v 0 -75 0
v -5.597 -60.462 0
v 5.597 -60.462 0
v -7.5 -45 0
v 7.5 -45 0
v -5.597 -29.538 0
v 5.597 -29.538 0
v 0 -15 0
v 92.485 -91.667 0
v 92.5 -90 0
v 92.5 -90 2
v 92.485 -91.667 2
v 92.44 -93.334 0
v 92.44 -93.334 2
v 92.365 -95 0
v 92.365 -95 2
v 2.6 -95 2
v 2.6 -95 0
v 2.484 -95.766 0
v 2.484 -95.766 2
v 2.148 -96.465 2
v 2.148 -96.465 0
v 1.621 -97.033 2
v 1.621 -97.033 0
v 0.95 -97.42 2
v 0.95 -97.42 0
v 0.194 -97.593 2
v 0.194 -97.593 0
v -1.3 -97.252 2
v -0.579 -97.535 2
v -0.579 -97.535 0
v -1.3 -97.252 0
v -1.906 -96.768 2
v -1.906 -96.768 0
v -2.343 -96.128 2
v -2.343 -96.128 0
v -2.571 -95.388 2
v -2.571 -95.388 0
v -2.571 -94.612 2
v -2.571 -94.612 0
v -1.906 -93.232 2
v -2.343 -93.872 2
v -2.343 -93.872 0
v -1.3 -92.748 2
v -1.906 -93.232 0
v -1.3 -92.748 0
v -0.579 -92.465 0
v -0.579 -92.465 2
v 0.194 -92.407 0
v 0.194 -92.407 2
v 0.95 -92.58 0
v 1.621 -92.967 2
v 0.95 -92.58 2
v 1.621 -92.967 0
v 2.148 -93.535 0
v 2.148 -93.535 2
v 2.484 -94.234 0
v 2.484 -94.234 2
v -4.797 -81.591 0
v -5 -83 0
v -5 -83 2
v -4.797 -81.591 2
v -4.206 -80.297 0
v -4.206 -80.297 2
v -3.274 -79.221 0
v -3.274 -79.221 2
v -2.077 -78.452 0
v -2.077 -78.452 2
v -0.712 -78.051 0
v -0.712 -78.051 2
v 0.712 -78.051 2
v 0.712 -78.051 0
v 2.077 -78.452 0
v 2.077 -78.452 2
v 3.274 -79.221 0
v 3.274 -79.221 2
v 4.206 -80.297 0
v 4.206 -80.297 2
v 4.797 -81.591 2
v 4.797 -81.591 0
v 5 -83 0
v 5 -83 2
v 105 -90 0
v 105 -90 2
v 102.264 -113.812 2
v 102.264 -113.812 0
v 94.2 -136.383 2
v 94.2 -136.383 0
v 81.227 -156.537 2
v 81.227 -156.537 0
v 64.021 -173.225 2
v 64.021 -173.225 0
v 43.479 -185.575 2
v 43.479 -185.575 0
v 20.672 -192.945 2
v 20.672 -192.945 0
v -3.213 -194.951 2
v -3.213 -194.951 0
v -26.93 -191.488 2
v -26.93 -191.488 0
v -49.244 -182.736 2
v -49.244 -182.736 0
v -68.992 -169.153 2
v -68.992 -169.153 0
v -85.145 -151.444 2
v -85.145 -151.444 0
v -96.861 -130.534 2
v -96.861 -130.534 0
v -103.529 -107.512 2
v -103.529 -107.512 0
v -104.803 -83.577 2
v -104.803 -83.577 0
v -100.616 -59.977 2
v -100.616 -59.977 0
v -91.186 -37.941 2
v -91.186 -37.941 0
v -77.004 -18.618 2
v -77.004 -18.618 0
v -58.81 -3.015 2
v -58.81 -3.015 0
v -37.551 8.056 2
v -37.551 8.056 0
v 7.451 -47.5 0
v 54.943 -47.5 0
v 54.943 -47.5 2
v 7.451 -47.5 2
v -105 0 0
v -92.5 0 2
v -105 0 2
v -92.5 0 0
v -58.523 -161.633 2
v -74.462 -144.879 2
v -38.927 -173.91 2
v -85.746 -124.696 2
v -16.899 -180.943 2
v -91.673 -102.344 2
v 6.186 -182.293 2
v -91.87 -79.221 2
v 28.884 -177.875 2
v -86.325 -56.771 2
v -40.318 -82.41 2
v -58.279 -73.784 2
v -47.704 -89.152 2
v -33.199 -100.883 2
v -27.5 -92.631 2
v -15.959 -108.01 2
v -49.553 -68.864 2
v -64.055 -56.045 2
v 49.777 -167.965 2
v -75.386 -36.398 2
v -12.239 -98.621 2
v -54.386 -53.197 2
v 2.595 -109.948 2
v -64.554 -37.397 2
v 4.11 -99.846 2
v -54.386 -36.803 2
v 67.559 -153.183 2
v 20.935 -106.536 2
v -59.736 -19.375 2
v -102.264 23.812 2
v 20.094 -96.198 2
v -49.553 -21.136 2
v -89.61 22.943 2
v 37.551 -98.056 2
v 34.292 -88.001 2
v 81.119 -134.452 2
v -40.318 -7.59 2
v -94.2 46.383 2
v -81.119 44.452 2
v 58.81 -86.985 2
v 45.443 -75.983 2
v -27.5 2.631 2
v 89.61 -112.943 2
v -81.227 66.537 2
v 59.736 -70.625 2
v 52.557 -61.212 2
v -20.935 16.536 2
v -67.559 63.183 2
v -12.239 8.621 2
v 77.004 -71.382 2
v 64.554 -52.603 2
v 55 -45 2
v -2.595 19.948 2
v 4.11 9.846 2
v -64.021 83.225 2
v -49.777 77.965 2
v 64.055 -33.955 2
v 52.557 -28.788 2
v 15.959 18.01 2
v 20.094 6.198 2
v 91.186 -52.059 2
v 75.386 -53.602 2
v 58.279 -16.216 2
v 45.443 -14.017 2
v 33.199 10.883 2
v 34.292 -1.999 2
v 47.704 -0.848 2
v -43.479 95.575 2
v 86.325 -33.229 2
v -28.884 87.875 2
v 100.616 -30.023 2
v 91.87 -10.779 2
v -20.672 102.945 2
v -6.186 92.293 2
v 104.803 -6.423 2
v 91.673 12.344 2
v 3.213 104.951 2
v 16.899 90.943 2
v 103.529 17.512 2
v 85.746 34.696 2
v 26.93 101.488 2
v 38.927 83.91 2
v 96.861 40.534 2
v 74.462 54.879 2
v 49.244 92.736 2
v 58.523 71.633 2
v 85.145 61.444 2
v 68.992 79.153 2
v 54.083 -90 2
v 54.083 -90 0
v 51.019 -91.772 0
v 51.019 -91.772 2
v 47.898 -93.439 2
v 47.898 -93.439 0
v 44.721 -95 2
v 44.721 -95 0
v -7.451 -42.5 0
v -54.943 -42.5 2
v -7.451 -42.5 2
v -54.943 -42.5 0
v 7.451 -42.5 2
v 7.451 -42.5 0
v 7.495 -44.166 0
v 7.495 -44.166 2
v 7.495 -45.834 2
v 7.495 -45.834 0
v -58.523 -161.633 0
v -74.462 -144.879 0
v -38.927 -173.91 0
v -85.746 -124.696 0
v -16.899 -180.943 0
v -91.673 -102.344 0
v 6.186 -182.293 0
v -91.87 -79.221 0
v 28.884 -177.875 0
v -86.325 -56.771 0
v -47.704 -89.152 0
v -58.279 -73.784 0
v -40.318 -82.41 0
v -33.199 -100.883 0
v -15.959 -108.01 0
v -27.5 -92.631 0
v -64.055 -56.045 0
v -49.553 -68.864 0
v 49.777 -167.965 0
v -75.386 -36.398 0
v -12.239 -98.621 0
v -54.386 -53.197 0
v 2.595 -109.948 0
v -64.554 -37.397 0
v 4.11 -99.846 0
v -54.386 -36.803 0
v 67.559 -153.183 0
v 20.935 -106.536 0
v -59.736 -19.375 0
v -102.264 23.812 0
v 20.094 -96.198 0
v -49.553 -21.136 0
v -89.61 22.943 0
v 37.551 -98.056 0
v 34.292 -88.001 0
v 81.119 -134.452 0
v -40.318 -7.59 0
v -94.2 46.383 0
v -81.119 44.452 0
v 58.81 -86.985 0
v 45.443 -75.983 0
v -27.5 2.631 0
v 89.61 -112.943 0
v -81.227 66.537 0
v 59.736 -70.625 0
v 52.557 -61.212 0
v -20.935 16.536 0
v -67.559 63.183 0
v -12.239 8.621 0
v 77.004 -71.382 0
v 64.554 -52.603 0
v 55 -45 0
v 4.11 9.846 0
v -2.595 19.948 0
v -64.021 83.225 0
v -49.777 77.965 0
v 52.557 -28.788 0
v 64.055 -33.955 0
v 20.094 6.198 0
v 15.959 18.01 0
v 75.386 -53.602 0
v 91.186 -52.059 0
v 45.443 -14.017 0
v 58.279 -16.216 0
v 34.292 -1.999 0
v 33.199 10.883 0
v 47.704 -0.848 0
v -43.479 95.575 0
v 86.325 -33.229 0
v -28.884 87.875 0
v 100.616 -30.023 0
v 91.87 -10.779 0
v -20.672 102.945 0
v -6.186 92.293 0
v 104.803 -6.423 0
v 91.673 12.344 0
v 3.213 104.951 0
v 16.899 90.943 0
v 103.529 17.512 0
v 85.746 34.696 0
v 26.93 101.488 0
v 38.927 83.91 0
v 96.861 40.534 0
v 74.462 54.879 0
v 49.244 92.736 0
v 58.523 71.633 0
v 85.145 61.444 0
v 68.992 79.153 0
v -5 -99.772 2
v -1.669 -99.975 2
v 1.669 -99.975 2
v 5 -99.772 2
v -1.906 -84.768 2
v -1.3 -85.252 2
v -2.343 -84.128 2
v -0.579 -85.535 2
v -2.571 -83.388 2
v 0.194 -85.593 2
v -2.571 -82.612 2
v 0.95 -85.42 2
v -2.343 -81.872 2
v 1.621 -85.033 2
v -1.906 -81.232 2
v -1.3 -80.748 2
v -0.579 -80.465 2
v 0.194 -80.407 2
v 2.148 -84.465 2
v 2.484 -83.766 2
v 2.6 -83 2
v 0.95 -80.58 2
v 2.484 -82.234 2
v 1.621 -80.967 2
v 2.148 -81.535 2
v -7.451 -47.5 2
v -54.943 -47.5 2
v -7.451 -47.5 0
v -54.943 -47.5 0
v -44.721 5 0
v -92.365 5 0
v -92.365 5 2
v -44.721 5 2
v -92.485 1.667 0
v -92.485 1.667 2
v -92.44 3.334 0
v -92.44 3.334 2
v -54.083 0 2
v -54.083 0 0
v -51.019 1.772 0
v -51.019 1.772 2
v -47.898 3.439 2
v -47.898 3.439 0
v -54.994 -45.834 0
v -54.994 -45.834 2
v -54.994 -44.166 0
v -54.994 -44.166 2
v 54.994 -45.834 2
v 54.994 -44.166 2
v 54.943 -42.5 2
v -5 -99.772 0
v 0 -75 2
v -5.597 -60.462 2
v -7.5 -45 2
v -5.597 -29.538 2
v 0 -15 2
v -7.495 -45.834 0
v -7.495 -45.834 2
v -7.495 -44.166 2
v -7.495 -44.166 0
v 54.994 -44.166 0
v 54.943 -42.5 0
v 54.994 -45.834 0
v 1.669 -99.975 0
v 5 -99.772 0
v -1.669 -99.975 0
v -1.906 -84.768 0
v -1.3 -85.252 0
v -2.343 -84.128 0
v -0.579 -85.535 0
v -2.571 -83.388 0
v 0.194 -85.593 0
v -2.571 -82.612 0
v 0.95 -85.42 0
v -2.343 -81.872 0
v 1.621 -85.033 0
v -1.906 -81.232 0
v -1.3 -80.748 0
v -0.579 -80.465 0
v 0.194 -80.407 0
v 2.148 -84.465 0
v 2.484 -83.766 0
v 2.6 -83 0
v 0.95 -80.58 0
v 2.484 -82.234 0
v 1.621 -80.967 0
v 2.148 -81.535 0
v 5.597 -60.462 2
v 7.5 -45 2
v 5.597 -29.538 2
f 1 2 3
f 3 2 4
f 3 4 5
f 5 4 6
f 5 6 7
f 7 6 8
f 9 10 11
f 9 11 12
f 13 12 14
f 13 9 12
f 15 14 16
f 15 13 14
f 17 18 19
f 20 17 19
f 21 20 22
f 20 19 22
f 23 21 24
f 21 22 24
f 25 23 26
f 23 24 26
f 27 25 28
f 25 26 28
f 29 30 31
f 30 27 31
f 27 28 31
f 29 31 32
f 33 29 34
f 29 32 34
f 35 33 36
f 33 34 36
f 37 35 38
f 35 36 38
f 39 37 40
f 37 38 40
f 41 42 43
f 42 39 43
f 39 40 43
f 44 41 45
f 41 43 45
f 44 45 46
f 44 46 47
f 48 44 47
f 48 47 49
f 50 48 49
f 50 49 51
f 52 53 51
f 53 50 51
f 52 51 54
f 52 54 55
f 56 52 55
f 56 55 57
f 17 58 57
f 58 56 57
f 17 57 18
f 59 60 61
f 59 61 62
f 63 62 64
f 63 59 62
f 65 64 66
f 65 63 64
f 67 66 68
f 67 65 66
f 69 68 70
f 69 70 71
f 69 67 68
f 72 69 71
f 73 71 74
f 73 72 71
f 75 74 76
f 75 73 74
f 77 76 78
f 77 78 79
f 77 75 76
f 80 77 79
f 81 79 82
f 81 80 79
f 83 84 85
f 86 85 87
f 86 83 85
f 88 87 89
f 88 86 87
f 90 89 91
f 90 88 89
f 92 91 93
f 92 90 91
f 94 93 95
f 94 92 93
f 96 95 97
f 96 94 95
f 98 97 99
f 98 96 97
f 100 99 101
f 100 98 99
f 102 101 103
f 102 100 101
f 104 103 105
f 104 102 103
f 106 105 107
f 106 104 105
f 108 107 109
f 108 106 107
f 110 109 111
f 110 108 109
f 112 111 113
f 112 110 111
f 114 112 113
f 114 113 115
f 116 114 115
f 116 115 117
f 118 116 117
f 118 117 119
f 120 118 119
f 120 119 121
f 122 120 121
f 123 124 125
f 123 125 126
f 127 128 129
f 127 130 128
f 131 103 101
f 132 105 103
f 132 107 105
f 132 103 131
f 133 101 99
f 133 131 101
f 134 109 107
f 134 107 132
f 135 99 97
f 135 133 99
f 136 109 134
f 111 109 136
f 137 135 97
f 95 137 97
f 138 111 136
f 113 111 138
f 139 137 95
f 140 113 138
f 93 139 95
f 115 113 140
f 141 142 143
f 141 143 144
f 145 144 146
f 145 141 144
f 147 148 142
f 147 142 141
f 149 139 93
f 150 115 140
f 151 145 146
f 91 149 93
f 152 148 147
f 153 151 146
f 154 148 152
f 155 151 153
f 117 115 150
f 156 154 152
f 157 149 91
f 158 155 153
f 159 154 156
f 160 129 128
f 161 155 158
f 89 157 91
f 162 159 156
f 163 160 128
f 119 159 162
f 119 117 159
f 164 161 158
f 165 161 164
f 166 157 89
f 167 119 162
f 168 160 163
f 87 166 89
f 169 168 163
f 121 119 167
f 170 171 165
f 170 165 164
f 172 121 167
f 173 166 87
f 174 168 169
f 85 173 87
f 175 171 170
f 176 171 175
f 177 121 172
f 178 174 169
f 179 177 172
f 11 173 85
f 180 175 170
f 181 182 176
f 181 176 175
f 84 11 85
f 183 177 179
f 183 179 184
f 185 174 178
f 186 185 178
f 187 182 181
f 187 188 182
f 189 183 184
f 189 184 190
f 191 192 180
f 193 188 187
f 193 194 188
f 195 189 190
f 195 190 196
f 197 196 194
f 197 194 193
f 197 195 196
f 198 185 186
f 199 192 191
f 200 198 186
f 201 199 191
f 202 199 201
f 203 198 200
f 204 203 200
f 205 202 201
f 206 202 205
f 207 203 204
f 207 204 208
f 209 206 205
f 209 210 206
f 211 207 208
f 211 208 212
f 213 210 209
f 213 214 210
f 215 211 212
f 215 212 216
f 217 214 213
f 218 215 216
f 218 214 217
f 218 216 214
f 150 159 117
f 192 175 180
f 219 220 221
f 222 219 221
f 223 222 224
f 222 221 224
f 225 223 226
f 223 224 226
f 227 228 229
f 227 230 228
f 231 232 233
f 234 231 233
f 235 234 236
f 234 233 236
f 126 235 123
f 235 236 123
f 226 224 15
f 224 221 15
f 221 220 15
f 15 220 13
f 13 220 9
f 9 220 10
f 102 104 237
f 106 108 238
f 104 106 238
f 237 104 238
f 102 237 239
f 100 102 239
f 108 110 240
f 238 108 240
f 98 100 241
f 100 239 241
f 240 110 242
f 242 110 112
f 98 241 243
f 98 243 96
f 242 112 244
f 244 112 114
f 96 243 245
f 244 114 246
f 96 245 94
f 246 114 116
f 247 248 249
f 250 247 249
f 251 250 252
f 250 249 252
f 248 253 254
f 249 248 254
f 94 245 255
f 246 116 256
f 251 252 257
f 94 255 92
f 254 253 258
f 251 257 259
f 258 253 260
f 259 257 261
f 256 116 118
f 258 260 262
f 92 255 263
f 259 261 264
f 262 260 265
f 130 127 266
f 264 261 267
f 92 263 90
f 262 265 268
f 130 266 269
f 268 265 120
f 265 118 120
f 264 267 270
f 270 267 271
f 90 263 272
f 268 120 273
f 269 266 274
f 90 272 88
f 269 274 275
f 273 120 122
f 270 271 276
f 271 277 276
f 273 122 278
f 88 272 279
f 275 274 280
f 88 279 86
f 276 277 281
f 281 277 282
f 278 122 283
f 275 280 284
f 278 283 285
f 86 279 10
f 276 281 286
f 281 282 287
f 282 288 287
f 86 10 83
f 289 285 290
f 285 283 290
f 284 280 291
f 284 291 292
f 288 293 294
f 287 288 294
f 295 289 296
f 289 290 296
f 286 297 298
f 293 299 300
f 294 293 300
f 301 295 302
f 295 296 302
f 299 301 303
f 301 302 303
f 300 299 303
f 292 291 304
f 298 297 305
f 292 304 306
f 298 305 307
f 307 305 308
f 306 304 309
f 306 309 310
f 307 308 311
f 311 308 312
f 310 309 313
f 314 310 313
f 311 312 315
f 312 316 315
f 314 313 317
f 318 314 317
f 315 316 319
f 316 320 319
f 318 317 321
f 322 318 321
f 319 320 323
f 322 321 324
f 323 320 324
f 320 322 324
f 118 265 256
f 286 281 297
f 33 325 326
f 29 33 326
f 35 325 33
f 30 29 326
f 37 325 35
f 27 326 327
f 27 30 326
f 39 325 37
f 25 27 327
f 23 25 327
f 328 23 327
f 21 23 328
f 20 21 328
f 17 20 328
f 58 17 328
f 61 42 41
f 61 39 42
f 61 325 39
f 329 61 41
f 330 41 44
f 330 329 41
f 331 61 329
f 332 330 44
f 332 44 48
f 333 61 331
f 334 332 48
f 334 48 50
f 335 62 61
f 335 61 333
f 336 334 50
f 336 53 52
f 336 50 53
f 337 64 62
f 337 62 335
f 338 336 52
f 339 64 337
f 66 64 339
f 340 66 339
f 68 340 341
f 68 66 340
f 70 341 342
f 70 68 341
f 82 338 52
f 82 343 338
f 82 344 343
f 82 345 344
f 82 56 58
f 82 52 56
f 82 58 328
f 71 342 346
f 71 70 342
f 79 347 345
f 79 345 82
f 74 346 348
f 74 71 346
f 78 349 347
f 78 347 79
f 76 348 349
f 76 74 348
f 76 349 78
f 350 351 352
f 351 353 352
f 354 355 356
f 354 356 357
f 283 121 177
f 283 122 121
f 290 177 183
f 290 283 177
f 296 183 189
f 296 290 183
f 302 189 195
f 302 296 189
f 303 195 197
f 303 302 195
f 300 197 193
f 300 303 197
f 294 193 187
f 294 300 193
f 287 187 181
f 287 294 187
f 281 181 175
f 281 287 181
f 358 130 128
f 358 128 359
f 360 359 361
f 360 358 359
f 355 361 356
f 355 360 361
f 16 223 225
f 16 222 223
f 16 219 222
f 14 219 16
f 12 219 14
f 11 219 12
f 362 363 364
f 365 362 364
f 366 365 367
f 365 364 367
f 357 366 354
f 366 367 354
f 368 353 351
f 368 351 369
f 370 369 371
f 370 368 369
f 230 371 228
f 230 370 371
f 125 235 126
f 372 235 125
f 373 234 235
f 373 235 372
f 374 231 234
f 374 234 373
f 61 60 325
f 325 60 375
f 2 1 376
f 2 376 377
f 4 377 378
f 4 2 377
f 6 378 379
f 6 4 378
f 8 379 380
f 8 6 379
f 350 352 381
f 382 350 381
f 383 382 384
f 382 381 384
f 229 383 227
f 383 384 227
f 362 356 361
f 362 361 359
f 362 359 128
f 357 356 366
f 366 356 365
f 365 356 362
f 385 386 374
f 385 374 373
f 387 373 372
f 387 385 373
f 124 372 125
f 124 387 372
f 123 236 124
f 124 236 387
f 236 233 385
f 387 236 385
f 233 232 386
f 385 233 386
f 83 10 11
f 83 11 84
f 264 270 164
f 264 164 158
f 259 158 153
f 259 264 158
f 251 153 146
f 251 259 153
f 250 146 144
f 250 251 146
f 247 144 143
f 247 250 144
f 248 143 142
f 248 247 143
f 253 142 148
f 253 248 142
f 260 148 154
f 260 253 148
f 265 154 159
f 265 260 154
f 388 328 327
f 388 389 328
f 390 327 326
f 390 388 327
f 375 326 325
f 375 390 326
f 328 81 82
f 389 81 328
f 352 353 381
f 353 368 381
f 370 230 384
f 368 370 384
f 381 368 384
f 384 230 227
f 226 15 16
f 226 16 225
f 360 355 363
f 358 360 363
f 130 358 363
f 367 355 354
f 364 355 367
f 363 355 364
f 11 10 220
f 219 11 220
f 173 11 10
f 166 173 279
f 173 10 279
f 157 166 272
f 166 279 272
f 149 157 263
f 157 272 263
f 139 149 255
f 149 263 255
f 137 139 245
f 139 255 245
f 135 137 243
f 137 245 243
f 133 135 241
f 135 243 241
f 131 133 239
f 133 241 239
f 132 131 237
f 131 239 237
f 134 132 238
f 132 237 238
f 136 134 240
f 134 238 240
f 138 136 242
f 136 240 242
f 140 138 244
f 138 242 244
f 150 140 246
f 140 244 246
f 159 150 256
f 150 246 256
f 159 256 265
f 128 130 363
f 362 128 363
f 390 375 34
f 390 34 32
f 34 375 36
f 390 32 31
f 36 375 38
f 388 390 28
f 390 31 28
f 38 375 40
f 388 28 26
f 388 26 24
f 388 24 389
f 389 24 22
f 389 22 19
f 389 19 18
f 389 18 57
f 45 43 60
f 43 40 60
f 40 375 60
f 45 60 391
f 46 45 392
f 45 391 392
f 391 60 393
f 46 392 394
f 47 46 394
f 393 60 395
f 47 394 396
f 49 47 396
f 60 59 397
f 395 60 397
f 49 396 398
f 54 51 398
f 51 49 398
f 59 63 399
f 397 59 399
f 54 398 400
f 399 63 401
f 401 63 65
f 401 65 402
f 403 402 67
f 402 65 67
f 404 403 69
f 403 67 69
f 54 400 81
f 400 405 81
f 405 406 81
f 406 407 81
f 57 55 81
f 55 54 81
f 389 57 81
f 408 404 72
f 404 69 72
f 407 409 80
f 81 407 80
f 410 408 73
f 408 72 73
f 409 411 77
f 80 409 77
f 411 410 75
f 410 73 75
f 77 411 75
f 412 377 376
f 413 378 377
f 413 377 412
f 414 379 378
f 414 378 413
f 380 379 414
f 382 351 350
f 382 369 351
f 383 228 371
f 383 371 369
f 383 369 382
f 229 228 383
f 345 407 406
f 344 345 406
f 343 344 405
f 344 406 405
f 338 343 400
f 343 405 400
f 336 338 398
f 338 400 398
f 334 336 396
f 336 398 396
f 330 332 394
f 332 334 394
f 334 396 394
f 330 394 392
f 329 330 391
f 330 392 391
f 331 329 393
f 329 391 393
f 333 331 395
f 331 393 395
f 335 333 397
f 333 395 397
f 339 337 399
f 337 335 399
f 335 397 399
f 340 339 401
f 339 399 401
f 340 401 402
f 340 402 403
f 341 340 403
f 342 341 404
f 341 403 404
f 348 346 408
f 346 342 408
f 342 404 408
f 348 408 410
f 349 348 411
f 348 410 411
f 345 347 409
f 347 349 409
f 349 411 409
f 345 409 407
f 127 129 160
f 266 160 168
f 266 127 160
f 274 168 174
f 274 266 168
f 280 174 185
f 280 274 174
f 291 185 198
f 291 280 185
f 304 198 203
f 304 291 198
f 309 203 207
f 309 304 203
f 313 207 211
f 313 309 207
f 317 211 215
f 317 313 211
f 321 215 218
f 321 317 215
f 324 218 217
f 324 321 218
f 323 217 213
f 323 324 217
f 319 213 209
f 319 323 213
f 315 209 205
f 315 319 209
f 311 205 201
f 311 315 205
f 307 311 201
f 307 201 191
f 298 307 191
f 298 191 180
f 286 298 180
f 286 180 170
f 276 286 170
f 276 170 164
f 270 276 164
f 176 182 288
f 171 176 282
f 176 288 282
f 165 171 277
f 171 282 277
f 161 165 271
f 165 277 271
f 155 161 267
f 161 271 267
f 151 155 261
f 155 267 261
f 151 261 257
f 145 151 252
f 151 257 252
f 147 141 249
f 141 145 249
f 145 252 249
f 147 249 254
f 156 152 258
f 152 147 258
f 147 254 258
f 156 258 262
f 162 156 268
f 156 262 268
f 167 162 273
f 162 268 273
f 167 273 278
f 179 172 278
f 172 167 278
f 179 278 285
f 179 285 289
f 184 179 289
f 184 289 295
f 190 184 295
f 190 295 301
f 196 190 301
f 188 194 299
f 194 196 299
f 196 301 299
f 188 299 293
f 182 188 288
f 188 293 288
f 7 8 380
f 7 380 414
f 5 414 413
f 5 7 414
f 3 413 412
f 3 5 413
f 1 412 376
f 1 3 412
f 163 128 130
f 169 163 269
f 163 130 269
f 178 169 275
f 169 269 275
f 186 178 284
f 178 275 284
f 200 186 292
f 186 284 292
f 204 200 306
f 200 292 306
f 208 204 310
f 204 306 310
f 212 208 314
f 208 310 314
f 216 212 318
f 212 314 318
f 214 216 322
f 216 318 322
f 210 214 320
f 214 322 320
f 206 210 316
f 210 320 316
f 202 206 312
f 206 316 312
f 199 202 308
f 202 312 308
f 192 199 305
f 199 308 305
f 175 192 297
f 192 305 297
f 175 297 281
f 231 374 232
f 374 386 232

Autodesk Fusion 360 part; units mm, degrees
sketch "スケッチ1" plane through (0, 0, 0) normal (0, 0, 1) x (1, 0, 0)
  line L0 (0, 0) -> (0, -100) construction
  circle A0 centre (0, -45) radius 55
  arc A1 (-59.7357, -19.375) -> (92.5, -90) centre (0, -90) ccw
  arc A2 (-37.5514, 8.0556) -> (105, -90) centre (0, -90) ccw
  arc A3 (59.7357, -70.625) -> (-92.5, 0) centre (0, 0) ccw
  arc A4 (37.5514, -98.0556) -> (-105, 0) centre (0, 0) ccw
  line L1 (0, 0) -> (-92.5, 0) construction
  line L2 (-92.5, 0) -> (-105, 0)
  line L3 (0, -90) -> (92.5, -90) construction
  line L4 (92.5, -90) -> (105, -90)
  arc A5 (59.7357, -70.625) -> (-37.5514, 8.0556) centre (0, -45) ccw
  arc A6 (-59.7357, -19.375) -> (37.5514, -98.0556) centre (0, -45) ccw
  line L5 (-7.5, -45) -> (7.5, -45) construction
  arc A7 (0, -15) -> (0, -75) centre (56.25, -45) ccw
  arc A8 (0, -75) -> (0, -15) centre (-56.25, -45) ccw
  line L6 (-54.9432, -42.5) -> (-7.451, -42.5)
  line L7 (-54.9432, -47.5) -> (-7.451, -47.5)
  line L8 (54.9432, -42.5) -> (7.451, -42.5)
  line L9 (54.9432, -47.5) -> (7.451, -47.5)
  line L10 (-92.5, 0) -> (-54.0833, 0)
  line L11 (-92.3648, 5) -> (-44.7214, 5)
  line L12 (92.5, -90) -> (54.0833, -90)
  line L13 (92.3648, -95) -> (44.7214, -95)
  circle A9 centre (0, -83) radius 2.6
  circle A10 centre (0, -95) radius 2.6
  line L14 (-5, -83) -> (-5, -99.7723)
  line L15 (5, -83) -> (5, -99.7723)
  arc A11 (0, -78) -> (-5, -83) centre (0, -83) ccw
  arc A12 (5, -83) -> (0, -78) centre (0, -83) ccw
  point P0 (0, -15)
  point P1 (0, -75)
  point P2 (-5, -78)
  point P3 (5, -78)
  dimension "d1" = 210
  dimension "d2" = 185
  dimension "d3" = 90
  dimension "d4" = 210
  dimension "d5" = 185
  dimension "d6" = 130
  dimension "d7" = 110
  dimension "d8" = 15
  dimension "d9" = 30
  dimension "d10" = 30
  dimension "d11" = 5
  dimension "d12" = 5
  dimension "d13" = 5
  dimension "d14" = 5.2
  dimension "d15" = 5.2
  dimension "d16" = 12
  dimension "d17" = 5
  dimension "d18" = 10
  dimension "d24" = 5
extrude "押し出し1" add sketch "スケッチ1" along normal blind 2 contours A7 A8 | A1 A2 A3 A4 L2 L4 A5 A6 makes body 1 at (54.0161, -83.3084, 2) makes body 2 at (2.0332, -37.5983, 0)
extrude "押し出し2" add sketch "スケッチ1" along normal blind 2 separate body contours A0 A8 L8 L9 | A0 A7 L6 L7 | A0 L14 L15 A11 A12 | A1 A4 L12 L13 | A2 A3 L10 L11 makes body 3 at (-4.1903, -92.4616, 2) makes body 4 at (-65.8225, 2.2572, 0) makes body 5 at (65.8225, -92.2572, 0) makes body 6 at (39.1438, -46.389, 2) makes body 7 at (-39.1438, -46.389, 0)
equation "d4 = d1"
equation "d5 = d2"
equation "d10 = d9"
